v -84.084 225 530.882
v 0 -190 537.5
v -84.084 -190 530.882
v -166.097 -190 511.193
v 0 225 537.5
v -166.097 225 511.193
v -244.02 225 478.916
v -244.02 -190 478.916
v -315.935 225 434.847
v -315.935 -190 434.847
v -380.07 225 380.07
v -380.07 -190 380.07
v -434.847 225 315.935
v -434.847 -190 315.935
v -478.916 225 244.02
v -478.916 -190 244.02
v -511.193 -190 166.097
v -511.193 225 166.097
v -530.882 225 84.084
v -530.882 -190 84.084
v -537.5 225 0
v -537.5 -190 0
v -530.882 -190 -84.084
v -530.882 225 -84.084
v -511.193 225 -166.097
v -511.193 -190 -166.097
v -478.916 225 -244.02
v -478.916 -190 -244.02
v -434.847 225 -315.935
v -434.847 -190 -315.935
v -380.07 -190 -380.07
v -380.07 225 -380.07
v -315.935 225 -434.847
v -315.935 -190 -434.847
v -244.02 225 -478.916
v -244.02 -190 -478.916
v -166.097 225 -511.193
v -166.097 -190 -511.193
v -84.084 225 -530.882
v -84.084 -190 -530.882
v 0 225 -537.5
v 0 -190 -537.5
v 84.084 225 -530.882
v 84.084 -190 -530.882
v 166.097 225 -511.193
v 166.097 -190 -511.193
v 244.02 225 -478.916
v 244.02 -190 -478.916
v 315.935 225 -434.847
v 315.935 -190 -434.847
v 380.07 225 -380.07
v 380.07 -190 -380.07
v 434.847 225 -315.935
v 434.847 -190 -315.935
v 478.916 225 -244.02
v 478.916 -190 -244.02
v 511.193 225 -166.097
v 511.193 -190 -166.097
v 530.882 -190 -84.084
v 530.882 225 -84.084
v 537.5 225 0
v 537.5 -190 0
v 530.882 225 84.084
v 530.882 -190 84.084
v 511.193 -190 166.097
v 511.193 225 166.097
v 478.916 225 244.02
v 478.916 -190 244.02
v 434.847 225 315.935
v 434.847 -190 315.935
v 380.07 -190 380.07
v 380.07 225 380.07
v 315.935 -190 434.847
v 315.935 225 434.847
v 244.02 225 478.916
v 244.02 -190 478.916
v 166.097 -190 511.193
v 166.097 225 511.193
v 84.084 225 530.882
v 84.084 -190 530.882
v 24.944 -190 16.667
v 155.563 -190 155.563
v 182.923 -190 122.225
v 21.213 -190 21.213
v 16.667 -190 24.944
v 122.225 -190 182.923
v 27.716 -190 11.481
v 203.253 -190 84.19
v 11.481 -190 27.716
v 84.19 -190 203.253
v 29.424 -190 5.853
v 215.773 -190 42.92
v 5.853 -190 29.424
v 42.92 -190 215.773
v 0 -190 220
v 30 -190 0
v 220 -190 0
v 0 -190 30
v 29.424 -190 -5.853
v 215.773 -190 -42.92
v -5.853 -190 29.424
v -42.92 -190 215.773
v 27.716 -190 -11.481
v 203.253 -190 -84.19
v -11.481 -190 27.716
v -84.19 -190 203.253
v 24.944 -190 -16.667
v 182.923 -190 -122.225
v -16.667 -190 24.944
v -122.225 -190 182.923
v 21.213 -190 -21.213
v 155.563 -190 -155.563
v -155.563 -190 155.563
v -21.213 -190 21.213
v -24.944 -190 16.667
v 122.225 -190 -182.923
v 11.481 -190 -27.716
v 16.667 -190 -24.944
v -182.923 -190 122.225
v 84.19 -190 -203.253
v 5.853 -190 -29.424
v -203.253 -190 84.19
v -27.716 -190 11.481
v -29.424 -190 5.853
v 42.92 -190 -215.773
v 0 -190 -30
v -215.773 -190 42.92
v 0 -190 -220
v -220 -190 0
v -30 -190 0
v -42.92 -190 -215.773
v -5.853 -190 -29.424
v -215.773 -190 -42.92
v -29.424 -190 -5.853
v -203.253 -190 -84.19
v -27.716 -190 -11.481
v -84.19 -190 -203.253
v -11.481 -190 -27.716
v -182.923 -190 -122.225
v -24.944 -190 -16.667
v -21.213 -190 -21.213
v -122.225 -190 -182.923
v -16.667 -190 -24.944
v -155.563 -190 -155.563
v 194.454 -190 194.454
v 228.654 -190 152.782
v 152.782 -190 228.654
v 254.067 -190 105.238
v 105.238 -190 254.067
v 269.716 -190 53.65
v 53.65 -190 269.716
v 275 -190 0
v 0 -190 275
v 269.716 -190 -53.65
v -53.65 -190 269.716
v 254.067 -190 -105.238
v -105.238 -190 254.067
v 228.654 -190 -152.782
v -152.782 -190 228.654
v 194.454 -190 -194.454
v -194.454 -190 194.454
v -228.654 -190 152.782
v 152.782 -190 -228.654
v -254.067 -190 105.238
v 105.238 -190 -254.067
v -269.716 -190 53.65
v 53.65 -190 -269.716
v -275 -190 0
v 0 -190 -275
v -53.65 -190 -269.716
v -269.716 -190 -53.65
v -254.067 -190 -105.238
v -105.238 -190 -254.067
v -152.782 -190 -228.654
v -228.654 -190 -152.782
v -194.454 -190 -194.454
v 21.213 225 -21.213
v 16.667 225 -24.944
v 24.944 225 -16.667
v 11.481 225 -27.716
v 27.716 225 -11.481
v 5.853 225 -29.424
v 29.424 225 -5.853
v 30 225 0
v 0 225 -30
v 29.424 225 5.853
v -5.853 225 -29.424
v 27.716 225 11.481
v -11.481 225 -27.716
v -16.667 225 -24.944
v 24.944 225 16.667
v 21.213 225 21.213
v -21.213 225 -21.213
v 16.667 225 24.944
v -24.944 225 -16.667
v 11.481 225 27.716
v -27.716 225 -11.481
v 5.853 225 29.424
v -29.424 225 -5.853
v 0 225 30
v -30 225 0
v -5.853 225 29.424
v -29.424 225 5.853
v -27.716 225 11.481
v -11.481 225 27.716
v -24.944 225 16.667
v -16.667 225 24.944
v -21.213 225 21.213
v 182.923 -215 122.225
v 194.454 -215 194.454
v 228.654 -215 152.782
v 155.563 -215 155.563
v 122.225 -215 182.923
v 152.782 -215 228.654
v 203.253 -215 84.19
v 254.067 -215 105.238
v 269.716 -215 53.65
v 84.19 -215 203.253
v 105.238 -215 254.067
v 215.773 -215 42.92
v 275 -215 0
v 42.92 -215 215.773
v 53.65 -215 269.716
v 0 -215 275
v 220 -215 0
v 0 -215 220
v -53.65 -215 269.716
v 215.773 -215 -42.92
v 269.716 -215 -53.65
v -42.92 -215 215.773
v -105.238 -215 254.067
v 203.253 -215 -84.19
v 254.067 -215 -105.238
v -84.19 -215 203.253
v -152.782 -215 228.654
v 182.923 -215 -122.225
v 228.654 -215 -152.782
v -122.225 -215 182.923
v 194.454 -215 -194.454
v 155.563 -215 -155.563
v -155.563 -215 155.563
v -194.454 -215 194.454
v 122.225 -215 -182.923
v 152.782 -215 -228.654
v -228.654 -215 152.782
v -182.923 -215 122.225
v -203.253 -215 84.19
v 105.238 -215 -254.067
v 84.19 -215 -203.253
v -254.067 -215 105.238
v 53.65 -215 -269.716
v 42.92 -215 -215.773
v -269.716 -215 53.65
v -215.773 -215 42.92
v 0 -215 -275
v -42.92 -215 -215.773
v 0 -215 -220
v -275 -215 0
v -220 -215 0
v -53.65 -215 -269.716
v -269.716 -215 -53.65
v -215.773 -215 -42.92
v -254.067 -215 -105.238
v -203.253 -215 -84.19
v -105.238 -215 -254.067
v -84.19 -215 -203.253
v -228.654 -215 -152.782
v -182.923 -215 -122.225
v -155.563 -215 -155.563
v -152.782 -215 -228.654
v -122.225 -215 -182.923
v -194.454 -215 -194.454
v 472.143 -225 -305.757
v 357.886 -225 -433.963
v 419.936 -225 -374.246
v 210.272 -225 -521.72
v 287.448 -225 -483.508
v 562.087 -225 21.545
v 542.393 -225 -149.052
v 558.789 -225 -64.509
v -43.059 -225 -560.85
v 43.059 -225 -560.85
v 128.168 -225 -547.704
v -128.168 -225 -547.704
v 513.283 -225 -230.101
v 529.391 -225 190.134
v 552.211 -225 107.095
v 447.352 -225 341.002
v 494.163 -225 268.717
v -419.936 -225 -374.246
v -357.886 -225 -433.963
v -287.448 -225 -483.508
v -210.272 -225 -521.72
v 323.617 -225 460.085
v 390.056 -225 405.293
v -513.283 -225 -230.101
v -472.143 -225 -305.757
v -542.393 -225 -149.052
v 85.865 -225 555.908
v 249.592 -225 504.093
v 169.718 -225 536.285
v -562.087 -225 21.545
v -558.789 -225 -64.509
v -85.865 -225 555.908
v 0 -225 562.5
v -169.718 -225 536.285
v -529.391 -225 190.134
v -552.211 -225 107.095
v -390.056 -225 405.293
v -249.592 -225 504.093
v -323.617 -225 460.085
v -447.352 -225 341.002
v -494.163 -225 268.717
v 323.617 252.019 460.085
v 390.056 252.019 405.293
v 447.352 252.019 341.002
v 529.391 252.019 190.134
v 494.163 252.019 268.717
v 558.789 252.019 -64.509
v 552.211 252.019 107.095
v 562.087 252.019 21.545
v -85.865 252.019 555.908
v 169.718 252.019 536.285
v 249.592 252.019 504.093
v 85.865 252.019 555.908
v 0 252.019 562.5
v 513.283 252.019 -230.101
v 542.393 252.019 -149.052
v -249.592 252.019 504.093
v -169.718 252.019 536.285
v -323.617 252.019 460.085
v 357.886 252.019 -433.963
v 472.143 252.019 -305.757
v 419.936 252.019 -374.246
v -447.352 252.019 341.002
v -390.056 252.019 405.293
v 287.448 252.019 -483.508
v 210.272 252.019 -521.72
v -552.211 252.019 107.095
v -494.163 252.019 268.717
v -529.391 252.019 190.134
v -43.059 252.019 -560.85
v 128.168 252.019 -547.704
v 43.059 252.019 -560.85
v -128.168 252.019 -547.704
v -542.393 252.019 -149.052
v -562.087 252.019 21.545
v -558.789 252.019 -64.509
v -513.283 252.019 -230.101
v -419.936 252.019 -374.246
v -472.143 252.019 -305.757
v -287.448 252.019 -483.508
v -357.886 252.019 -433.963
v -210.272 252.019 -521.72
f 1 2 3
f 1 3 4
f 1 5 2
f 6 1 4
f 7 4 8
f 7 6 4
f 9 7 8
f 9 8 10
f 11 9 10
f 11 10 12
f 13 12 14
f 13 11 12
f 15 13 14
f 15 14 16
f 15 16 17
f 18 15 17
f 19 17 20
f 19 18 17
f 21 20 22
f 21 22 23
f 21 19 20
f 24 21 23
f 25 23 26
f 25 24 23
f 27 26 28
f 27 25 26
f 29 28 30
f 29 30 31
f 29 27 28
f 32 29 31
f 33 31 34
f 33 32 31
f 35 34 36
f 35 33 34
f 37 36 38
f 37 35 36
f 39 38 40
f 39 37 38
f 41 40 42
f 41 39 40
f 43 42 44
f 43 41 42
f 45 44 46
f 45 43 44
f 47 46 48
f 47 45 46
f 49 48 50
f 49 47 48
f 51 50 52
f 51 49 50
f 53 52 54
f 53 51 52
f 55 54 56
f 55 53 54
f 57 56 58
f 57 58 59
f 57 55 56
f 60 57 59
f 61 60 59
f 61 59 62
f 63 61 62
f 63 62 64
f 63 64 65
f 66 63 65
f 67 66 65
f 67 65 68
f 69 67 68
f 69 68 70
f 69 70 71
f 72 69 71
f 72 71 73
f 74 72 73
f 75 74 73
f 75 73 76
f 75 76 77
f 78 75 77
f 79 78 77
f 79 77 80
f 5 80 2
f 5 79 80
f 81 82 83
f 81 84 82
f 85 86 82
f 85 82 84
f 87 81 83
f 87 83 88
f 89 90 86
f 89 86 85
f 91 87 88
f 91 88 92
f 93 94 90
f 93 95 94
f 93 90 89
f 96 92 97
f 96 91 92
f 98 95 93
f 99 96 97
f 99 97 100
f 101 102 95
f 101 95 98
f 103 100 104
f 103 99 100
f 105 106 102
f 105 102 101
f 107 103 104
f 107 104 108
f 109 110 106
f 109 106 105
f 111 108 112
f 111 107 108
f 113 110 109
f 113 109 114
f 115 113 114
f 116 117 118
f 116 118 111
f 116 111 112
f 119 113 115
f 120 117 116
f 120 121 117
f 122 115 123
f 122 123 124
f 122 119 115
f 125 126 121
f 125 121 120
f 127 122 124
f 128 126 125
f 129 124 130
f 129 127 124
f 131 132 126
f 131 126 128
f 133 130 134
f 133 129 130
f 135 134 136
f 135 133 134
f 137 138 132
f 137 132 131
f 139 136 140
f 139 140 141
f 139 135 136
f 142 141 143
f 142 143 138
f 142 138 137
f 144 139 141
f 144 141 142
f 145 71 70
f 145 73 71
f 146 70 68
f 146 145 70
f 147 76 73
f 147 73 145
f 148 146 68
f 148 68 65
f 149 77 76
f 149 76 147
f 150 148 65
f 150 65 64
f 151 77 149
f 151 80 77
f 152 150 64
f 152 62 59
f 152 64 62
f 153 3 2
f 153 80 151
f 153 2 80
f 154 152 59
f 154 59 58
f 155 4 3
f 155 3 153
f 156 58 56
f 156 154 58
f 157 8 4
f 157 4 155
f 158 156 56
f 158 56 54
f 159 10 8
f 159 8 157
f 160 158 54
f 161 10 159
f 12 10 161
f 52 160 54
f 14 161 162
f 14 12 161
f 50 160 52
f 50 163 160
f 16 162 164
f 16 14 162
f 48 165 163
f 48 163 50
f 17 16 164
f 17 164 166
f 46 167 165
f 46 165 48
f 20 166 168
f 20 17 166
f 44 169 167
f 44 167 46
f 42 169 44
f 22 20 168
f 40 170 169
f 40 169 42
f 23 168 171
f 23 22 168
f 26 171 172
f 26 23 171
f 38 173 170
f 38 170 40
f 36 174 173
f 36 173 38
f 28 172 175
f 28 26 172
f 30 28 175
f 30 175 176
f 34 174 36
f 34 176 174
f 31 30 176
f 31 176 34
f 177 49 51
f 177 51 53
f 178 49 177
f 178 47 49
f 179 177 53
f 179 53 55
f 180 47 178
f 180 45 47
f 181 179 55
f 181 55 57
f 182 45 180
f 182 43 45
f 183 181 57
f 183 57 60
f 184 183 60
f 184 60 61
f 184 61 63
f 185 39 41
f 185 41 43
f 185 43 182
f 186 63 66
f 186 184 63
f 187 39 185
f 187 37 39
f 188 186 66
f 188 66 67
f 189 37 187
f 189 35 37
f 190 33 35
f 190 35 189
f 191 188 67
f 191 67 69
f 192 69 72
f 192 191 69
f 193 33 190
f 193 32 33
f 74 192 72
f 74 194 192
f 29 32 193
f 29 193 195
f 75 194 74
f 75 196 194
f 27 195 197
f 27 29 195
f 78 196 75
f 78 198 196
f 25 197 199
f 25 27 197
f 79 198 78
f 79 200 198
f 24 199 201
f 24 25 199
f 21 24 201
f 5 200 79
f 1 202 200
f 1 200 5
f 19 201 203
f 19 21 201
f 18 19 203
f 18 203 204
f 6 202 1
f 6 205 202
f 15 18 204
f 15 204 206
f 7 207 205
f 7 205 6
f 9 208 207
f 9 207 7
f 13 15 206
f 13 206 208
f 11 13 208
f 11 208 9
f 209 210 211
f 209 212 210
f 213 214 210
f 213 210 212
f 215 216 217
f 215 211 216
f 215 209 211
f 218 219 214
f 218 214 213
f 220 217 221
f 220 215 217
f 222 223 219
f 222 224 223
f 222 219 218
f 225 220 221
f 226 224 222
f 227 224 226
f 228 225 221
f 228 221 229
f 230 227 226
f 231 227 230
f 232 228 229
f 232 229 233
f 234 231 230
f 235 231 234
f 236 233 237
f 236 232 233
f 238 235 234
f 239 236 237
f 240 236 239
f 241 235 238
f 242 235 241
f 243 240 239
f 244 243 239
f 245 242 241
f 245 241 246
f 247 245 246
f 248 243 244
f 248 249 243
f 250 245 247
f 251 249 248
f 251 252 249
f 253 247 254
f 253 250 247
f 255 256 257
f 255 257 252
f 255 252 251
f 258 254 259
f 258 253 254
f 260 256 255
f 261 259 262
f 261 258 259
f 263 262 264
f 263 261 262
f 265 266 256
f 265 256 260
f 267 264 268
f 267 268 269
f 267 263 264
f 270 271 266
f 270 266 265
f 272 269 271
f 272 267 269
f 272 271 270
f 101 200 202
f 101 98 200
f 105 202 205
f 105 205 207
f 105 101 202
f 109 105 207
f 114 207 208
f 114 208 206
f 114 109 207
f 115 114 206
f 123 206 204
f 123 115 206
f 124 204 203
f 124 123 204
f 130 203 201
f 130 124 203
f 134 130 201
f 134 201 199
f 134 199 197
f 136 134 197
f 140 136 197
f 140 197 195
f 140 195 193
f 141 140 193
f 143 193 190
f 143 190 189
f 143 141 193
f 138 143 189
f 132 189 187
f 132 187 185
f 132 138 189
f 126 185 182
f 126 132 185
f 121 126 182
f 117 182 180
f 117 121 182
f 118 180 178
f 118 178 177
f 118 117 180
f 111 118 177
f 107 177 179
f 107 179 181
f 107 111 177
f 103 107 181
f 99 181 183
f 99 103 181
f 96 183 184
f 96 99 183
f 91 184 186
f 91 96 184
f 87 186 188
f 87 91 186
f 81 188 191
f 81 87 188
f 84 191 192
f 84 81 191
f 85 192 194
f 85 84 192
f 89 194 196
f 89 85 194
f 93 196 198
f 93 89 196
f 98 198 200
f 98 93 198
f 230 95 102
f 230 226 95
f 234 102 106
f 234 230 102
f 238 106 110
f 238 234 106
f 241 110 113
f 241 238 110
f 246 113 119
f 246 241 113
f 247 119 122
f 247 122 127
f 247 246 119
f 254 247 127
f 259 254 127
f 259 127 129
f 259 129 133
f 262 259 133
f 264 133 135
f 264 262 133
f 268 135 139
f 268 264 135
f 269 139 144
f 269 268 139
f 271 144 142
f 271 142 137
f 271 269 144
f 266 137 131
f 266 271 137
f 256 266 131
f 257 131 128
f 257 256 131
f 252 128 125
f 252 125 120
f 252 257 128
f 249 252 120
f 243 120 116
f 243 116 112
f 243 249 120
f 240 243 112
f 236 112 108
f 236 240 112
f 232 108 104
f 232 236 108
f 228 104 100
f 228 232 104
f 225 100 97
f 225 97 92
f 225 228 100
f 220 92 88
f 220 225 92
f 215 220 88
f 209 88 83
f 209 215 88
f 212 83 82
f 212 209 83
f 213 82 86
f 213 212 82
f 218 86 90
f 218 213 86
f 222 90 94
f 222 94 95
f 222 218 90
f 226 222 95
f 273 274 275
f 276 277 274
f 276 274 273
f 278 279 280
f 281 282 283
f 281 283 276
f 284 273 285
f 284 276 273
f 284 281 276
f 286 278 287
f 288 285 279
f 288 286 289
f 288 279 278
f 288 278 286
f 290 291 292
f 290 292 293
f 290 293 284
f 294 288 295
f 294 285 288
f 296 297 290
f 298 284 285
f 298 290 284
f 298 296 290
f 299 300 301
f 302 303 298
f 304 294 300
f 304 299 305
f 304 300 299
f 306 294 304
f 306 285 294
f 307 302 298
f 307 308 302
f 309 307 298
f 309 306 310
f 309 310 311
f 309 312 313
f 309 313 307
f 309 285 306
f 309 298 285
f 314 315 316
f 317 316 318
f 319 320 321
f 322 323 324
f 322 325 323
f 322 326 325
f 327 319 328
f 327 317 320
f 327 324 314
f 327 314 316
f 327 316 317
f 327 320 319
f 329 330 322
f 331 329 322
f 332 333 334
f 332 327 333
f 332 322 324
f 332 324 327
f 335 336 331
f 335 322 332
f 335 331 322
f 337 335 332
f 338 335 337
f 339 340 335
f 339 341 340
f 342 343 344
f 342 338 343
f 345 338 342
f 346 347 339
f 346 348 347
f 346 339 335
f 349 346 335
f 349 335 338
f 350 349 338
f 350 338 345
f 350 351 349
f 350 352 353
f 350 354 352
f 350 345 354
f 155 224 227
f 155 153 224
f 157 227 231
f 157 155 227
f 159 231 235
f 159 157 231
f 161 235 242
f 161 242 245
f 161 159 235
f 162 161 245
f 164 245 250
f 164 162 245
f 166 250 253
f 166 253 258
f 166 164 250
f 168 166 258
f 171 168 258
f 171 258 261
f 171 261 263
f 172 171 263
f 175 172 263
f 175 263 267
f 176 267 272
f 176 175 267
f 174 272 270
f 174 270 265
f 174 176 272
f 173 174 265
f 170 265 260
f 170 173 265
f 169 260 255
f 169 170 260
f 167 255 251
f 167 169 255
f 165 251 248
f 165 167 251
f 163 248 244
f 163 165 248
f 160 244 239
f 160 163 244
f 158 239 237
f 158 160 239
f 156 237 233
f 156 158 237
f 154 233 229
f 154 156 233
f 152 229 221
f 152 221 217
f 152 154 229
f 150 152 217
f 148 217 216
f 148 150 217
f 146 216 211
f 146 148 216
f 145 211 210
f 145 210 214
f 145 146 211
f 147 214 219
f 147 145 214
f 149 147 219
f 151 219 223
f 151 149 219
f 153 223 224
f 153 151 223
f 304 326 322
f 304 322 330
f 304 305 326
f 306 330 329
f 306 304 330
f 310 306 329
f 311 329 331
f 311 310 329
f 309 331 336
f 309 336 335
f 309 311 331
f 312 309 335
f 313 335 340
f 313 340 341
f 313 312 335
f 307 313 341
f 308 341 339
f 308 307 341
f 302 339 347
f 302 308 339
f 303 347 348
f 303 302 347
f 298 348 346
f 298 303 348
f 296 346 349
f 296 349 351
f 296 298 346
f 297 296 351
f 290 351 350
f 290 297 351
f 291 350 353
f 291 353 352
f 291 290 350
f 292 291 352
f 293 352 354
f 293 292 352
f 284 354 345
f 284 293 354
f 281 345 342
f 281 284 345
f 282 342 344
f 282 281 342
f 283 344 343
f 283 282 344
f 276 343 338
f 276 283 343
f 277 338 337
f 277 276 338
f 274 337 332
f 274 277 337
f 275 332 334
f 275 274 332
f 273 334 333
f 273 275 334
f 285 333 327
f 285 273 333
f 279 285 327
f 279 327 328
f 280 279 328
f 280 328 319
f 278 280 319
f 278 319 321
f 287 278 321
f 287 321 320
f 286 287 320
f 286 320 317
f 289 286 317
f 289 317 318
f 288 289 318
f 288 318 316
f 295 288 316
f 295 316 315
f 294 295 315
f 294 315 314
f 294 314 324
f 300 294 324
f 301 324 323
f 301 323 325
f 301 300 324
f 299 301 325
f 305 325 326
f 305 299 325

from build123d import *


with BuildPart() as part:
    # Sketch1 → Revolve1 (revolve)
    with BuildSketch(Plane(origin=(0, 0, 0), x_dir=(0, 0, -1), z_dir=(1, 0, 0))):
        Polygon((-562.5, 225), (-562.5, -225), (0, -225), (0, -185), (0, 225), (0, 252.019037432), (-562.5, 252.019037432), align=None)
        Polygon((-30, -190), (-220, -190), (-220, -215), (-275, -215), (-275, -190), (-537.5, -190), (-537.5, 185), (-537.5, 225), (-30, 225), (-30, 185), align=None, mode=Mode.SUBTRACT)
    revolve(axis=Axis((0, 225, 0), (0, -1, 0)))


solid = part.part
